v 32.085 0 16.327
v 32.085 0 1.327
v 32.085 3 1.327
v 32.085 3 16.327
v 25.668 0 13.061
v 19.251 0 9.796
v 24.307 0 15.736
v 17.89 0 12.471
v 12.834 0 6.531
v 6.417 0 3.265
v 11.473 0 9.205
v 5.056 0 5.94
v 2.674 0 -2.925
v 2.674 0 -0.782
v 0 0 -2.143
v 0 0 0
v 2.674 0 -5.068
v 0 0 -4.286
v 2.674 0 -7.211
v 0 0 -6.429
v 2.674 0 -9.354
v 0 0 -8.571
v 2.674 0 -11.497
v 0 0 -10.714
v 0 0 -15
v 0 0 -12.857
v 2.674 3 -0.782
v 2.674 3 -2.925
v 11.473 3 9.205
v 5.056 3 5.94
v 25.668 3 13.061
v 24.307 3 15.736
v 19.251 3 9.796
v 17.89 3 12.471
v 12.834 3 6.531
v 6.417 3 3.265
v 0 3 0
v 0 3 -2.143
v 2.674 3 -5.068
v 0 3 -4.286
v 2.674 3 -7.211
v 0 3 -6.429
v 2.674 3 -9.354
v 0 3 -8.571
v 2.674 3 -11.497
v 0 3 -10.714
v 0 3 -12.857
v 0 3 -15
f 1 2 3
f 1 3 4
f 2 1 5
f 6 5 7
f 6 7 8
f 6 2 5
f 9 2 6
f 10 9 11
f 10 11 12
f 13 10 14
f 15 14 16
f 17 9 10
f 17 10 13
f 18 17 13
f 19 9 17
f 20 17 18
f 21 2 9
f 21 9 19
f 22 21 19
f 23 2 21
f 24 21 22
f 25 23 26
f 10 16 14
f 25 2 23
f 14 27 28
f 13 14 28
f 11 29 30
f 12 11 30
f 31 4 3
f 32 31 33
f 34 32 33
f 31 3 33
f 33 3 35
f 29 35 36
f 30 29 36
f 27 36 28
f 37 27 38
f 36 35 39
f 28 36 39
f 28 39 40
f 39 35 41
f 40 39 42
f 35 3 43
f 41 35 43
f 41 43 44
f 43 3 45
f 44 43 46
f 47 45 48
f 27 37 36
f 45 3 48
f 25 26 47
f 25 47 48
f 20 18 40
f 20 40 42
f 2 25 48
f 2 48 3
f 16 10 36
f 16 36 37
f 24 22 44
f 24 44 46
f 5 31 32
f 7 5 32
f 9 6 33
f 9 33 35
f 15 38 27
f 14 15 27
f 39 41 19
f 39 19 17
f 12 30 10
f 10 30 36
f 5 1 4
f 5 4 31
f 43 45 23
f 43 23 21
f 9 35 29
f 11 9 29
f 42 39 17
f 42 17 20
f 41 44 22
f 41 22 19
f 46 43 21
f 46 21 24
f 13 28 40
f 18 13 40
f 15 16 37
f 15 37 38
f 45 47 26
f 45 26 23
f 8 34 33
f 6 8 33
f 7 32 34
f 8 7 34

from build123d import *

# Parameters (mm, degrees)
BOSS_EXTRUDE1_DEPTH = 3
BOSS_EXTRUDE2_DEPTH = 3
CUT_EXTRUDE1_DEPTH  = 4


with BuildPart() as part:
    # Sketch1 → Boss-Extrude1 (new body)
    with BuildSketch(Plane(origin=(0, 0, 0), x_dir=(1, 0, 0), z_dir=(0, 1, 0))):
        Polygon((0, 0), (0, 15), (32.084787993, -1.326860674), (32.084787993, -16.326860674), align=None)
    extrude(amount=BOSS_EXTRUDE1_DEPTH)

    # Sketch2 → Boss-Extrude2 (add)
    with BuildSketch(Plane(origin=(0, 3, 0), x_dir=(1, 0, 0), z_dir=(0, 1, 0))):
        Polygon((25.667830391, -13.061488537), (24.306761694, -15.735988526), (17.889804096, -12.470616391), (19.250872792, -9.796116403), align=None)
        Polygon((12.833915194, -6.530744268), (11.472846497, -9.205244257), (5.055888898, -5.939872122), (6.416957595, -3.265372133), align=None)
    extrude(amount=-BOSS_EXTRUDE2_DEPTH)

    # Sketch3 → Cut-Extrude1 (cut, through all)
    with BuildSketch(Plane(origin=(0, 3, 0), x_dir=(1, 0, 0), z_dir=(0, 1, 0))):
        Polygon((2.673732333, 0.782286134), (2.673732333, 2.925143134), (0, 4.285714857), (0, 2.142857857), align=None)
        Polygon((2.673732333, 5.068000134), (0, 6.428571857), (0, 8.571428857), (2.673732333, 7.210857134), align=None)
        Polygon((2.673732333, 9.353714134), (0, 10.714285857), (0, 12.857142857), (2.673732333, 11.496571134), align=None)
    extrude(amount=-CUT_EXTRUDE1_DEPTH, mode=Mode.SUBTRACT)


solid = part.part
